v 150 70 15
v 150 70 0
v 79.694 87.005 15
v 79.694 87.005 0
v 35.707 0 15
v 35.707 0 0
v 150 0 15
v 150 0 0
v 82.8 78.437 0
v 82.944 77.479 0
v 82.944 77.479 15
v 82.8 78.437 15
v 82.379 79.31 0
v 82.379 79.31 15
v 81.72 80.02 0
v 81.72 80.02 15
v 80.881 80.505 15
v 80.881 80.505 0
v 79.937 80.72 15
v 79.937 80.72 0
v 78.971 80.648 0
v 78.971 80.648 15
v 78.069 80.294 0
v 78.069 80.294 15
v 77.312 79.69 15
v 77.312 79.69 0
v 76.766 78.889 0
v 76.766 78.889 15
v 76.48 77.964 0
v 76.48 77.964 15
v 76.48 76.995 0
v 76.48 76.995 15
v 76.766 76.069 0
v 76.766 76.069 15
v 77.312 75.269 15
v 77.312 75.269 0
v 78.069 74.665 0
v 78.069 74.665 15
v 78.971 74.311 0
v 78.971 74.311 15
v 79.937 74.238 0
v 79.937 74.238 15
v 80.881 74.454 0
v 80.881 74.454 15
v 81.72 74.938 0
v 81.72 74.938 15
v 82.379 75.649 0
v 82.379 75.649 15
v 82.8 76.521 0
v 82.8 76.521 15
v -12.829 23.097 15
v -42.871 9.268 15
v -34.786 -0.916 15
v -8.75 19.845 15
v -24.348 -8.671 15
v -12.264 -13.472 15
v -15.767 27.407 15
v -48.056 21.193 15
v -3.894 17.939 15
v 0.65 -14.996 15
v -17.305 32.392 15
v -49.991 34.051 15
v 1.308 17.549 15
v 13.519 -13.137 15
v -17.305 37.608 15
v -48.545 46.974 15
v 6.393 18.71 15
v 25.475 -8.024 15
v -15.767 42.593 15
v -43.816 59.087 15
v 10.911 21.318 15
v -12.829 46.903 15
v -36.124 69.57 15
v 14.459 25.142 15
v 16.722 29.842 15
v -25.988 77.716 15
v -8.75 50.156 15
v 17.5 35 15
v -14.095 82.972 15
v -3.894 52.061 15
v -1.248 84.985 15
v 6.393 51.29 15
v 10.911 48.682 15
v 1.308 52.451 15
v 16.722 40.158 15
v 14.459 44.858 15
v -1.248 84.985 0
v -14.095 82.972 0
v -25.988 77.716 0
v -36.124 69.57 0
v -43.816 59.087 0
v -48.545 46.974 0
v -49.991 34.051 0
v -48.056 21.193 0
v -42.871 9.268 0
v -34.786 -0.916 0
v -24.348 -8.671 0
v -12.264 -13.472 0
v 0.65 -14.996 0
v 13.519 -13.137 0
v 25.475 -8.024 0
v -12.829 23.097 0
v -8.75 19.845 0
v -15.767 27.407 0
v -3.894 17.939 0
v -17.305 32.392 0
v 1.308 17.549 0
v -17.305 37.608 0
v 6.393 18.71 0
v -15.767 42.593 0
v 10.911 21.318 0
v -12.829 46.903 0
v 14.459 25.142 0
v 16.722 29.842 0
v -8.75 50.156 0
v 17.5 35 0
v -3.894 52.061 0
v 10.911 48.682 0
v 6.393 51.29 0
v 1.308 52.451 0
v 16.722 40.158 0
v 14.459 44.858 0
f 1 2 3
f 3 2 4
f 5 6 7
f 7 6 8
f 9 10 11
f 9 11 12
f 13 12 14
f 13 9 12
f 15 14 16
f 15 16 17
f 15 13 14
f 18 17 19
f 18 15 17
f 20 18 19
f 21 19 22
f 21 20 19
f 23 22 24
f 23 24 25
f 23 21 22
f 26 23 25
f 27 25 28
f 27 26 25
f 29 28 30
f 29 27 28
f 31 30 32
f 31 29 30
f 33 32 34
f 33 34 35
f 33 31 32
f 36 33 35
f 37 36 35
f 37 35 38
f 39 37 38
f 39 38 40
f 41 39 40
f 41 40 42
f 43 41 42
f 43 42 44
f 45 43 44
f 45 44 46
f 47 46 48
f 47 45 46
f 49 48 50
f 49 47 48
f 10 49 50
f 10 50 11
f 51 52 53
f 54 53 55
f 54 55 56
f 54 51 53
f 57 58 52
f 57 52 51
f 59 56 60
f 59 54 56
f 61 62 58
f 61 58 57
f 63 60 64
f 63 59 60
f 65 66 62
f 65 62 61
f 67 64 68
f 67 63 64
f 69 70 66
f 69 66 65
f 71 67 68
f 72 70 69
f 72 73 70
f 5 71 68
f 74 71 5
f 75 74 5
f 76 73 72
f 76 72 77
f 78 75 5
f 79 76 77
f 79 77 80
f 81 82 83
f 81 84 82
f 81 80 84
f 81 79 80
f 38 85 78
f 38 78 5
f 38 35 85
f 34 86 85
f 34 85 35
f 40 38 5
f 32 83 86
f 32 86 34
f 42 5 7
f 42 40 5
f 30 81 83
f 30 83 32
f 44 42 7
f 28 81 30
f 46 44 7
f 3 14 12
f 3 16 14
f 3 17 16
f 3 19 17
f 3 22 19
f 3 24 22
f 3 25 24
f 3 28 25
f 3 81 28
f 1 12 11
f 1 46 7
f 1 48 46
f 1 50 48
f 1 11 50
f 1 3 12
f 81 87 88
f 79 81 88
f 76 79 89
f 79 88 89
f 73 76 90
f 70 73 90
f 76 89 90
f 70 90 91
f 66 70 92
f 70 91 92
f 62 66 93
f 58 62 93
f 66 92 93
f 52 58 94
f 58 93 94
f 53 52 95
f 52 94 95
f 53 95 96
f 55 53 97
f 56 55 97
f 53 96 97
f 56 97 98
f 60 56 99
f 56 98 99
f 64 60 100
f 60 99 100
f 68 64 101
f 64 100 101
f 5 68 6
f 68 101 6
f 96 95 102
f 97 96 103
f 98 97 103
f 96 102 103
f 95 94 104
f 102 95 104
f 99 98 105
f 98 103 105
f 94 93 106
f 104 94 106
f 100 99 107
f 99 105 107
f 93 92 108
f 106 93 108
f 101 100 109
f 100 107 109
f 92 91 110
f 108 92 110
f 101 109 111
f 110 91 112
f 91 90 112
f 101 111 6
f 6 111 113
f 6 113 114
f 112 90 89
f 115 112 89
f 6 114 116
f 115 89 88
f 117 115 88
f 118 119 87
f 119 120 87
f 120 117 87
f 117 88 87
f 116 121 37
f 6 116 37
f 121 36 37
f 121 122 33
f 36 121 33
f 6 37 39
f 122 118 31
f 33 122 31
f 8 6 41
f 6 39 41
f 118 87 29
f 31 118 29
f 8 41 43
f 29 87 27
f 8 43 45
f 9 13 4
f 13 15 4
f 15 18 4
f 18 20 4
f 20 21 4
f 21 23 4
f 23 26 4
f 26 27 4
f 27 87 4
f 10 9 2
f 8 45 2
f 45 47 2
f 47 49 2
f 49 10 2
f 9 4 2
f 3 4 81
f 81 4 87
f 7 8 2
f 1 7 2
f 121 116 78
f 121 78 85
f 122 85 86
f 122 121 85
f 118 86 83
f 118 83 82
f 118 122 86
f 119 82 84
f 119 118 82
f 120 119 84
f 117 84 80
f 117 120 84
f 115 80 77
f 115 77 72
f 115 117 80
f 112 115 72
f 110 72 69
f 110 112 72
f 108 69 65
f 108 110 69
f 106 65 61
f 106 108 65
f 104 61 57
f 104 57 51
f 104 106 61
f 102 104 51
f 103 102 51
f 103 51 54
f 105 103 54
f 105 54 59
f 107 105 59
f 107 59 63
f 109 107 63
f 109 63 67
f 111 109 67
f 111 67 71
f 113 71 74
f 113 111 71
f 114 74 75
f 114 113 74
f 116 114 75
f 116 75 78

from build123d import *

# Parameters (mm, degrees)
SKETCH1_R           = 17.5
SKETCH1_R_2         = 3.25
BOSS_EXTRUDE1_DEPTH = 15


with BuildPart() as part:
    # Sketch1 → Boss-Extrude1 (new body)
    with BuildSketch(Plane.XY):
        with BuildLine():
            Line((149.99990581, 70.000115429), (79.694106831, 87.00526078))
            Line((79.694106831, 87.00526078), (-1.24795586, 84.984541416))
            ThreePointArc((-1.24795586, 84.984541416), (-45.852560512, 15.061426098), (35.707047952, 0.000115429))
            Line((35.707047952, 0.000115429), (149.99990581, 0.000115429))
            Line((149.99990581, 0.000115429), (149.99990581, 70.000115429))
        make_face()
        with Locations((-9.419e-05, 35.000115429)):
            Circle(SKETCH1_R, mode=Mode.SUBTRACT)
        with Locations((79.694106831, 77.479356086)):
            Circle(SKETCH1_R_2, mode=Mode.SUBTRACT)
    extrude(amount=BOSS_EXTRUDE1_DEPTH)


solid = part.part
